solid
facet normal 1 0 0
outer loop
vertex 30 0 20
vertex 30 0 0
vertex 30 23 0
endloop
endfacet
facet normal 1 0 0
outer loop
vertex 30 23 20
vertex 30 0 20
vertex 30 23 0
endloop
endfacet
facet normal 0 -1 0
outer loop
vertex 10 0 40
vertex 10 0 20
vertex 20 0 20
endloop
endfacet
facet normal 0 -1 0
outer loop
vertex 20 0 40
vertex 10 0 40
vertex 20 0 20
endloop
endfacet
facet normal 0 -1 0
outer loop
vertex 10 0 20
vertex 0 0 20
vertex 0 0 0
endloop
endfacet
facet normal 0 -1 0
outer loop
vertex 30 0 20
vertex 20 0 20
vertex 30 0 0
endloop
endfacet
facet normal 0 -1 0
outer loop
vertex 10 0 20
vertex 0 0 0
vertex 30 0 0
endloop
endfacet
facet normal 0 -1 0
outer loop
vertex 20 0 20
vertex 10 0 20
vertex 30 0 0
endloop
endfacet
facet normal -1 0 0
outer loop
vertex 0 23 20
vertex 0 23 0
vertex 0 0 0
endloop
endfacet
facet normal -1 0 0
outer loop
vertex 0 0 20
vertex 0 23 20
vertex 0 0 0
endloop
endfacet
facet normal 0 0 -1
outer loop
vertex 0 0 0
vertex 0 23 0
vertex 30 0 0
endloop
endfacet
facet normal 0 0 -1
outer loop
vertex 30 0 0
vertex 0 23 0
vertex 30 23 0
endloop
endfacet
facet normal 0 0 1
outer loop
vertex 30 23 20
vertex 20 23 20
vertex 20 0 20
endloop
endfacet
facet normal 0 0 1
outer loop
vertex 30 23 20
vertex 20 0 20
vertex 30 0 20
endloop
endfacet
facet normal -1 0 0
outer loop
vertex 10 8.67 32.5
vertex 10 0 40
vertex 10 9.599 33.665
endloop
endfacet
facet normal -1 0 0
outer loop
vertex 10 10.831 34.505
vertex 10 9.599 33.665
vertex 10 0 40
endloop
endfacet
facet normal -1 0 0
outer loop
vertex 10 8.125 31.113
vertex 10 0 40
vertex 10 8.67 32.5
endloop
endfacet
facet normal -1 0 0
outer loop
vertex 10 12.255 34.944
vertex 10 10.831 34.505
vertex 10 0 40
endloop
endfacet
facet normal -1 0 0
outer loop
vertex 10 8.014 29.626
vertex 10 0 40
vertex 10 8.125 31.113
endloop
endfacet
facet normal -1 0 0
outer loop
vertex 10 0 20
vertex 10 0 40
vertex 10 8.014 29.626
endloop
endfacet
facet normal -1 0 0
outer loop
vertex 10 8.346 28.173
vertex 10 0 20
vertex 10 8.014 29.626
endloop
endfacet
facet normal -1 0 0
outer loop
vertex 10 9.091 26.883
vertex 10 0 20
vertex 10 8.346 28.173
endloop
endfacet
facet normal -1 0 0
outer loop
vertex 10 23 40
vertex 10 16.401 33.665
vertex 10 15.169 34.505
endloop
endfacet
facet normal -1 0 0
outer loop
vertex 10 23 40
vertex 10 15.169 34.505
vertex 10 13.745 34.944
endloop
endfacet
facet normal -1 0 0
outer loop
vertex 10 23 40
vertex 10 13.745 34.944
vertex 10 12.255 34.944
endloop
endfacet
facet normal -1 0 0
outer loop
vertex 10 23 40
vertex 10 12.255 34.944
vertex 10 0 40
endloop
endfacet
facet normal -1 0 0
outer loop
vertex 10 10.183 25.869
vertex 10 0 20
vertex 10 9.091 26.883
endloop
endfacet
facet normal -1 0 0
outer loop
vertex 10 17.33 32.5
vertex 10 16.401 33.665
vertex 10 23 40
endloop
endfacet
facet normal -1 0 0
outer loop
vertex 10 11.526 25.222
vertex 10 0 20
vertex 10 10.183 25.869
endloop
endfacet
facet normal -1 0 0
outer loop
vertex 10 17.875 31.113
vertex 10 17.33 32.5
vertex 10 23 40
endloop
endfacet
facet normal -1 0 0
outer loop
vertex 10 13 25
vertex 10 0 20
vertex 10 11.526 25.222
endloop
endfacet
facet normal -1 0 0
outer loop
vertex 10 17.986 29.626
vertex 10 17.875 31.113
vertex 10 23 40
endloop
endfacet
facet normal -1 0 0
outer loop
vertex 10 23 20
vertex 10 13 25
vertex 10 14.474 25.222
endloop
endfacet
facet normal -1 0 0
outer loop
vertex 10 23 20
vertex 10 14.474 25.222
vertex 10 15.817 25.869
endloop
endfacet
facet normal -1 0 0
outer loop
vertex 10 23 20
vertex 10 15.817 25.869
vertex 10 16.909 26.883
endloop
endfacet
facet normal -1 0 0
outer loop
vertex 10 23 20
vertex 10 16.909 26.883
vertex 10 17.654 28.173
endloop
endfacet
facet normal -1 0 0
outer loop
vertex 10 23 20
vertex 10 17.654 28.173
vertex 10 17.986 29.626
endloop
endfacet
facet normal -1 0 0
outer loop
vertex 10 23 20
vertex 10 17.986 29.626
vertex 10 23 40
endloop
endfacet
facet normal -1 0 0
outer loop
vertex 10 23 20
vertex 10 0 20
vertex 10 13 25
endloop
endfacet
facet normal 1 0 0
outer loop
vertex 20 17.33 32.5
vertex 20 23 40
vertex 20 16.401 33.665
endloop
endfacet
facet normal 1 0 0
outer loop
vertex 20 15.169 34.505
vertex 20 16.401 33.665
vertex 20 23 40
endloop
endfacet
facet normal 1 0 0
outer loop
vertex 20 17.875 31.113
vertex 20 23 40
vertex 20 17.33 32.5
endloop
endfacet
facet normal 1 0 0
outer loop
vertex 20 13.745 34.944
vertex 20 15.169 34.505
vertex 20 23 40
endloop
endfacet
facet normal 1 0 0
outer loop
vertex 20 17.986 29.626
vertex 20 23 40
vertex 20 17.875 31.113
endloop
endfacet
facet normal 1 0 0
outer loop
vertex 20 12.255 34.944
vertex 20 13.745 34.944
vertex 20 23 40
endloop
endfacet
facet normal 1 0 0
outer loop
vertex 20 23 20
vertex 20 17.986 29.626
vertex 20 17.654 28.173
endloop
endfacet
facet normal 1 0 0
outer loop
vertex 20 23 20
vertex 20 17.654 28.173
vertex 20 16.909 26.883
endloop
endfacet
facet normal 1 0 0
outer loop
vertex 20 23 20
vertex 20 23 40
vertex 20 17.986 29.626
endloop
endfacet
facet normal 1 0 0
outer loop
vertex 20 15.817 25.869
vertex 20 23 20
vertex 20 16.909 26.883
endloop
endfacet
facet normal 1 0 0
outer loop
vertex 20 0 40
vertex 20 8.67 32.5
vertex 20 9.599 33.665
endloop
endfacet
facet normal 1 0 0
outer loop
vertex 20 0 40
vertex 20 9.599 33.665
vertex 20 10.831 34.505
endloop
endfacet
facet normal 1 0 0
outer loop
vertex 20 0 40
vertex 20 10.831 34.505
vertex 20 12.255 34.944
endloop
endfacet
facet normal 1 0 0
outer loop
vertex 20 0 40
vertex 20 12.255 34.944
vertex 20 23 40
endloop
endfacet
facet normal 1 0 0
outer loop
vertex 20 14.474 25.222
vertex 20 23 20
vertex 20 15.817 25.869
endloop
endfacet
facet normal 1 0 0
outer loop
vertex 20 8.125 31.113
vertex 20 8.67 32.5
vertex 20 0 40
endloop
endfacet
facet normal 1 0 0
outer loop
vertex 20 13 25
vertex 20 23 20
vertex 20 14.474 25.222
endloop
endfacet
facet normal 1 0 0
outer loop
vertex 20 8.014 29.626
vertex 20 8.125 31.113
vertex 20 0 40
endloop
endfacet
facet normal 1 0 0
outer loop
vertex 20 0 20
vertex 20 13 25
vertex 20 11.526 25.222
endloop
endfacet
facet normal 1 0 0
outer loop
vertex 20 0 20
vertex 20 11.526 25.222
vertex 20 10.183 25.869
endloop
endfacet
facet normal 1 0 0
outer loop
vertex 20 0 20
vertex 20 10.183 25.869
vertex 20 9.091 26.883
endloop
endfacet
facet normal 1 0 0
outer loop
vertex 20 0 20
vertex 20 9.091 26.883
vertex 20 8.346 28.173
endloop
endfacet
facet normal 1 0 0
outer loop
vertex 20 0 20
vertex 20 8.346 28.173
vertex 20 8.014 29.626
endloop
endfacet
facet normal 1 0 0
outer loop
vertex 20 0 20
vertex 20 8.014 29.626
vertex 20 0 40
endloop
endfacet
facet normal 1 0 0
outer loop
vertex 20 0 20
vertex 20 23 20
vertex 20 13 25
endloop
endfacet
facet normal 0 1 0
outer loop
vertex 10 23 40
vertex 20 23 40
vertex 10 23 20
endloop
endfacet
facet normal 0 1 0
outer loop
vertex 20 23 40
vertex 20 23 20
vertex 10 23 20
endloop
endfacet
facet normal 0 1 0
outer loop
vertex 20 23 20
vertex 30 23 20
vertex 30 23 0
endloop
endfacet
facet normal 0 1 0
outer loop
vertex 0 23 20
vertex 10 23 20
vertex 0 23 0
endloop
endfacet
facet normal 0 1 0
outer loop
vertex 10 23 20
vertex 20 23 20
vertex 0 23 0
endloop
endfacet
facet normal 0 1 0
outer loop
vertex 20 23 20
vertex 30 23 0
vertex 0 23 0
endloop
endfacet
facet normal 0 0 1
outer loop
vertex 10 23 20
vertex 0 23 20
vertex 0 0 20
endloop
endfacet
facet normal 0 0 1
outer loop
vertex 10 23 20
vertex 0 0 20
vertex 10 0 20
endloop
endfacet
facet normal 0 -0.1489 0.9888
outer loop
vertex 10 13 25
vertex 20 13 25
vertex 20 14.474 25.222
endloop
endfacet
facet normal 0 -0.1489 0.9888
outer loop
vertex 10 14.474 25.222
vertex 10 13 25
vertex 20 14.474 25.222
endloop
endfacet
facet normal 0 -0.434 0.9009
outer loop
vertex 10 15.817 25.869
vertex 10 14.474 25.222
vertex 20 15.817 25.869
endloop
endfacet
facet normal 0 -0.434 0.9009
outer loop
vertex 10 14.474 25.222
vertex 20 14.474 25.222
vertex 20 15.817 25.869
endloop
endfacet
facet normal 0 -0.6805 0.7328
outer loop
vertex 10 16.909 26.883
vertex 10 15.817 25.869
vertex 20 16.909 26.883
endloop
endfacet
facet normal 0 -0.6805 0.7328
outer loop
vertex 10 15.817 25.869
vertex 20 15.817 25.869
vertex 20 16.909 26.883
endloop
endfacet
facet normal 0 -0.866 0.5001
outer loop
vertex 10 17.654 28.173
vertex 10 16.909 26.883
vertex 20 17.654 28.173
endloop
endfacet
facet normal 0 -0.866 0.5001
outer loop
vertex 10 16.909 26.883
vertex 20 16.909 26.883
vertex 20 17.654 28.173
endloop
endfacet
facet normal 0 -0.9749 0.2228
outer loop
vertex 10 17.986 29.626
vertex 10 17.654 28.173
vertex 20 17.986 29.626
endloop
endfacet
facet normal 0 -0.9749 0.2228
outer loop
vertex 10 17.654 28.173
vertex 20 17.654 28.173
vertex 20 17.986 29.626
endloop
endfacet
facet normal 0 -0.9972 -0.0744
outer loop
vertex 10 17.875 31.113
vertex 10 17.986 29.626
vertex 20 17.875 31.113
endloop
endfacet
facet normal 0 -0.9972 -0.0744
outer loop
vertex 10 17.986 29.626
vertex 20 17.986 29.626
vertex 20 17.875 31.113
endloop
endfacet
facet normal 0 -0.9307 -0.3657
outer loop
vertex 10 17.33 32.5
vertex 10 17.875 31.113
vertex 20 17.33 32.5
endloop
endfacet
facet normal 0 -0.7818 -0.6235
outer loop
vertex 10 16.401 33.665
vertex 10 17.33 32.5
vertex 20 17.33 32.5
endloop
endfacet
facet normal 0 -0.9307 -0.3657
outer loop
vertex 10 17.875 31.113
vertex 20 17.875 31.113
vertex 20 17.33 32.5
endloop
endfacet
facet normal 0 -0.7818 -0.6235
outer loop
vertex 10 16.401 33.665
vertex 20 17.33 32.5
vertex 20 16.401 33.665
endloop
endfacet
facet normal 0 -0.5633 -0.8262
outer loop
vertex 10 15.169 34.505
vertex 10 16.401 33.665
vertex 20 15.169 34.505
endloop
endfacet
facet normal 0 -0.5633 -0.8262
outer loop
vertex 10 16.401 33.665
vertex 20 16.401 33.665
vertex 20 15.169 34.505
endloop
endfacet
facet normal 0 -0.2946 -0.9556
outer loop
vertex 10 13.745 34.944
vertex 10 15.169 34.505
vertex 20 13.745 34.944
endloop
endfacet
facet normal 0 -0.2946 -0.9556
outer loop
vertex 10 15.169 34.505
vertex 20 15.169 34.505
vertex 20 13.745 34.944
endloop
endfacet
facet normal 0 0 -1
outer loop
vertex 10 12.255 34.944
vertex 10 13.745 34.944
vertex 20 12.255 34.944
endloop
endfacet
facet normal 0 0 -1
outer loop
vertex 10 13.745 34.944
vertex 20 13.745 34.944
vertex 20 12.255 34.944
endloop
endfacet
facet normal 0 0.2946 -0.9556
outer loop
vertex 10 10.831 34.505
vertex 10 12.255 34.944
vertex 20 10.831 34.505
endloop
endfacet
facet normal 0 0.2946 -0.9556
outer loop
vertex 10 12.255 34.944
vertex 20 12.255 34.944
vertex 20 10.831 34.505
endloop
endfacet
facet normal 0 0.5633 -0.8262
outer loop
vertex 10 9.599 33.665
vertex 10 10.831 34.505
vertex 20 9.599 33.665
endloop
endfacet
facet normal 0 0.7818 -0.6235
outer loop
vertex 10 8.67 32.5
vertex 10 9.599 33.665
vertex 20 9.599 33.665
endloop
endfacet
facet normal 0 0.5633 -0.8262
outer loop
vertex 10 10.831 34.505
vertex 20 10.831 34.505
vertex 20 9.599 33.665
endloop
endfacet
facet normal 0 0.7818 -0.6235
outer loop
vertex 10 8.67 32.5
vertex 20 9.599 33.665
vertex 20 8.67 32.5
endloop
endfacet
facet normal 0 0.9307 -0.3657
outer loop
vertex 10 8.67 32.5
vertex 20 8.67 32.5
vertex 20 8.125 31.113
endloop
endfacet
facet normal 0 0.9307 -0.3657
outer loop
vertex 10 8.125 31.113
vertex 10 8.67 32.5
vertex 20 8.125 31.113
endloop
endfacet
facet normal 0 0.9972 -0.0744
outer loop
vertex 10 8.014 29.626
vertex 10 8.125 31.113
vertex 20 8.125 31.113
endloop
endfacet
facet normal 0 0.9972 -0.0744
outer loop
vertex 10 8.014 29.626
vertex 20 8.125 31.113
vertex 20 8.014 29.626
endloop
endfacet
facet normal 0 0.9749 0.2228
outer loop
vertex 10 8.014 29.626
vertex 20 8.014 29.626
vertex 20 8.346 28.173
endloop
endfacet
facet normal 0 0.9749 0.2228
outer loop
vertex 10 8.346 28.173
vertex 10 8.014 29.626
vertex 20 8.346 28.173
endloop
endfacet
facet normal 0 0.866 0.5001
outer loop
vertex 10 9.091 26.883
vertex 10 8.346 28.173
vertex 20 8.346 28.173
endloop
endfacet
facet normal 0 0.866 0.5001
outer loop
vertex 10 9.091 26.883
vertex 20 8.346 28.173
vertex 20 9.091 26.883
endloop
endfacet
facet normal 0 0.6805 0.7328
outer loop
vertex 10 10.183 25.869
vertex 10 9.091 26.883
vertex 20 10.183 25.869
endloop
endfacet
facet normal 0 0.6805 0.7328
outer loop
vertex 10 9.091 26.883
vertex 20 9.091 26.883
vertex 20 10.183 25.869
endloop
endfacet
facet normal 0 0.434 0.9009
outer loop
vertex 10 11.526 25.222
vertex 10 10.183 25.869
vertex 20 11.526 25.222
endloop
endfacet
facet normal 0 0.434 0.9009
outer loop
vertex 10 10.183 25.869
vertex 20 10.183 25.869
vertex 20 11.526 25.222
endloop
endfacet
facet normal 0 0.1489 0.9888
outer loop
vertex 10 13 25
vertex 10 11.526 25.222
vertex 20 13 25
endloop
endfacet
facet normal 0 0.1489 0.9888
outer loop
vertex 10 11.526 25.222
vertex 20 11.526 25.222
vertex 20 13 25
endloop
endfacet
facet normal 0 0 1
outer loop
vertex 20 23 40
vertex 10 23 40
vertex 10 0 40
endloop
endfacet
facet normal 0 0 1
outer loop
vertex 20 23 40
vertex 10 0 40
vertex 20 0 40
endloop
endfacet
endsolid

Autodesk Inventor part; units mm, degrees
ref_plane "YZ Plane" through (0, 0, 0) normal (1, 0, 0) x (0, 1, 0)
ref_plane "XZ Plane" through (0, 0, 0) normal (0, 1, 0) x (-1, 0, 0)
ref_plane "XY Plane" through (0, 0, 0) normal (0, 0, 1) x (1, 0, 0)
sketch "Sketch1" plane through (0, 0, 0) normal (0, 0, 1) x (1, 0, 0)
  line L0 (0, 0) -> (30, 0)
  line L1 (30, 0) -> (30, 23)
  line L2 (30, 23) -> (0, 23)
  line L3 (0, 23) -> (0, 0)
  dimension "d0" = 30
  dimension "d1" = 23
extrude "Extrusion1" add sketch "Sketch1" along normal blind 20
sketch "Sketch2" plane through (0, 0, 20) normal (0, 0, 1) x (1, 0, 0)
  line L0 (30, 23) -> (0, 23) projected
  line L1 (0, 23) -> (0, 13)
  line L2 (0, 23) -> (0, 0) projected
  dimension "d4" = 10
sketch "Sketch3" plane through (0, 0, 20) normal (0, 0, 1) x (1, 0, 0)
  point P0 (0, 0)
sketch "Sketch4" plane through (0, 0, 20) normal (0, 0, 1) x (1, 0, 0)
  line L0 (0, 23) -> (0, 0) projected
  line L1 (0, 13) -> (0, 20)
  dimension "d5" = 7
sketch "Sketch5" plane through (0, 0, 20) normal (0, 0, 1) x (1, 0, 0)
  line L0 (0, 23) -> (0, 0) projected
  line L1 (0, 13) -> (0, 18)
  dimension "d6" = 5
sketch "Sketch6" plane through (0, 0, 20) normal (0, 0, 1) x (1, 0, 0)
  line L0 (0, 23) -> (10, 23)
  line L1 (30, 23) -> (0, 23) projected
  line L2 (10, 23) -> (20, 23)
  line L3 (0, 0) -> (30, 0) projected
  line L4 (10, 23) -> (20, 23)
  line L5 (20, 23) -> (20, 0)
  line L6 (20, 0) -> (10, 0)
  line L7 (10, 0) -> (10, 23)
  dimension "d7" = 10
  dimension "d8" = 10
extrude "Extrusion2" add sketch "Sketch6" along normal blind 20
sketch "Sketch7" plane through (20, 0, 20) normal (1, 0, 0) x (0, 0, -1)
  line L0 (0, 23) -> (-20, 23) projected
  line L1 (-20, 23) -> (-20, 13)
  line L2 (-20, 23) -> (-20, 0) projected
  line L3 (-20, 13) -> (-10, 13)
  circle A0 centre (-10, 13) radius 5
  point P0 (20, 0)
  dimension "d11" = 10
  dimension "d12" = 10
  dimension "d13" = 10
extrude "Extrusion3" cut sketch "Sketch7" against normal blind 20
equation "\"BendRadius\" = Thickness"
equation "\"BendReliefWidth\" = Thickness"
equation "\"BendReliefDepth\" = 0.5 * Thickness"
equation "\"CornerReliefSize\" = 4 * Thickness"
equation "\"MinimumRemnant\" = 2 * Thickness"
equation "\"TransitionRadius\" = BendRadius"
equation "\"JacobiRadiusSize\" = BendRadius"
equation "\"GapSize\" = Thickness"
equation "\"Thickness\" = 0.5"
properties part number "pusher"
